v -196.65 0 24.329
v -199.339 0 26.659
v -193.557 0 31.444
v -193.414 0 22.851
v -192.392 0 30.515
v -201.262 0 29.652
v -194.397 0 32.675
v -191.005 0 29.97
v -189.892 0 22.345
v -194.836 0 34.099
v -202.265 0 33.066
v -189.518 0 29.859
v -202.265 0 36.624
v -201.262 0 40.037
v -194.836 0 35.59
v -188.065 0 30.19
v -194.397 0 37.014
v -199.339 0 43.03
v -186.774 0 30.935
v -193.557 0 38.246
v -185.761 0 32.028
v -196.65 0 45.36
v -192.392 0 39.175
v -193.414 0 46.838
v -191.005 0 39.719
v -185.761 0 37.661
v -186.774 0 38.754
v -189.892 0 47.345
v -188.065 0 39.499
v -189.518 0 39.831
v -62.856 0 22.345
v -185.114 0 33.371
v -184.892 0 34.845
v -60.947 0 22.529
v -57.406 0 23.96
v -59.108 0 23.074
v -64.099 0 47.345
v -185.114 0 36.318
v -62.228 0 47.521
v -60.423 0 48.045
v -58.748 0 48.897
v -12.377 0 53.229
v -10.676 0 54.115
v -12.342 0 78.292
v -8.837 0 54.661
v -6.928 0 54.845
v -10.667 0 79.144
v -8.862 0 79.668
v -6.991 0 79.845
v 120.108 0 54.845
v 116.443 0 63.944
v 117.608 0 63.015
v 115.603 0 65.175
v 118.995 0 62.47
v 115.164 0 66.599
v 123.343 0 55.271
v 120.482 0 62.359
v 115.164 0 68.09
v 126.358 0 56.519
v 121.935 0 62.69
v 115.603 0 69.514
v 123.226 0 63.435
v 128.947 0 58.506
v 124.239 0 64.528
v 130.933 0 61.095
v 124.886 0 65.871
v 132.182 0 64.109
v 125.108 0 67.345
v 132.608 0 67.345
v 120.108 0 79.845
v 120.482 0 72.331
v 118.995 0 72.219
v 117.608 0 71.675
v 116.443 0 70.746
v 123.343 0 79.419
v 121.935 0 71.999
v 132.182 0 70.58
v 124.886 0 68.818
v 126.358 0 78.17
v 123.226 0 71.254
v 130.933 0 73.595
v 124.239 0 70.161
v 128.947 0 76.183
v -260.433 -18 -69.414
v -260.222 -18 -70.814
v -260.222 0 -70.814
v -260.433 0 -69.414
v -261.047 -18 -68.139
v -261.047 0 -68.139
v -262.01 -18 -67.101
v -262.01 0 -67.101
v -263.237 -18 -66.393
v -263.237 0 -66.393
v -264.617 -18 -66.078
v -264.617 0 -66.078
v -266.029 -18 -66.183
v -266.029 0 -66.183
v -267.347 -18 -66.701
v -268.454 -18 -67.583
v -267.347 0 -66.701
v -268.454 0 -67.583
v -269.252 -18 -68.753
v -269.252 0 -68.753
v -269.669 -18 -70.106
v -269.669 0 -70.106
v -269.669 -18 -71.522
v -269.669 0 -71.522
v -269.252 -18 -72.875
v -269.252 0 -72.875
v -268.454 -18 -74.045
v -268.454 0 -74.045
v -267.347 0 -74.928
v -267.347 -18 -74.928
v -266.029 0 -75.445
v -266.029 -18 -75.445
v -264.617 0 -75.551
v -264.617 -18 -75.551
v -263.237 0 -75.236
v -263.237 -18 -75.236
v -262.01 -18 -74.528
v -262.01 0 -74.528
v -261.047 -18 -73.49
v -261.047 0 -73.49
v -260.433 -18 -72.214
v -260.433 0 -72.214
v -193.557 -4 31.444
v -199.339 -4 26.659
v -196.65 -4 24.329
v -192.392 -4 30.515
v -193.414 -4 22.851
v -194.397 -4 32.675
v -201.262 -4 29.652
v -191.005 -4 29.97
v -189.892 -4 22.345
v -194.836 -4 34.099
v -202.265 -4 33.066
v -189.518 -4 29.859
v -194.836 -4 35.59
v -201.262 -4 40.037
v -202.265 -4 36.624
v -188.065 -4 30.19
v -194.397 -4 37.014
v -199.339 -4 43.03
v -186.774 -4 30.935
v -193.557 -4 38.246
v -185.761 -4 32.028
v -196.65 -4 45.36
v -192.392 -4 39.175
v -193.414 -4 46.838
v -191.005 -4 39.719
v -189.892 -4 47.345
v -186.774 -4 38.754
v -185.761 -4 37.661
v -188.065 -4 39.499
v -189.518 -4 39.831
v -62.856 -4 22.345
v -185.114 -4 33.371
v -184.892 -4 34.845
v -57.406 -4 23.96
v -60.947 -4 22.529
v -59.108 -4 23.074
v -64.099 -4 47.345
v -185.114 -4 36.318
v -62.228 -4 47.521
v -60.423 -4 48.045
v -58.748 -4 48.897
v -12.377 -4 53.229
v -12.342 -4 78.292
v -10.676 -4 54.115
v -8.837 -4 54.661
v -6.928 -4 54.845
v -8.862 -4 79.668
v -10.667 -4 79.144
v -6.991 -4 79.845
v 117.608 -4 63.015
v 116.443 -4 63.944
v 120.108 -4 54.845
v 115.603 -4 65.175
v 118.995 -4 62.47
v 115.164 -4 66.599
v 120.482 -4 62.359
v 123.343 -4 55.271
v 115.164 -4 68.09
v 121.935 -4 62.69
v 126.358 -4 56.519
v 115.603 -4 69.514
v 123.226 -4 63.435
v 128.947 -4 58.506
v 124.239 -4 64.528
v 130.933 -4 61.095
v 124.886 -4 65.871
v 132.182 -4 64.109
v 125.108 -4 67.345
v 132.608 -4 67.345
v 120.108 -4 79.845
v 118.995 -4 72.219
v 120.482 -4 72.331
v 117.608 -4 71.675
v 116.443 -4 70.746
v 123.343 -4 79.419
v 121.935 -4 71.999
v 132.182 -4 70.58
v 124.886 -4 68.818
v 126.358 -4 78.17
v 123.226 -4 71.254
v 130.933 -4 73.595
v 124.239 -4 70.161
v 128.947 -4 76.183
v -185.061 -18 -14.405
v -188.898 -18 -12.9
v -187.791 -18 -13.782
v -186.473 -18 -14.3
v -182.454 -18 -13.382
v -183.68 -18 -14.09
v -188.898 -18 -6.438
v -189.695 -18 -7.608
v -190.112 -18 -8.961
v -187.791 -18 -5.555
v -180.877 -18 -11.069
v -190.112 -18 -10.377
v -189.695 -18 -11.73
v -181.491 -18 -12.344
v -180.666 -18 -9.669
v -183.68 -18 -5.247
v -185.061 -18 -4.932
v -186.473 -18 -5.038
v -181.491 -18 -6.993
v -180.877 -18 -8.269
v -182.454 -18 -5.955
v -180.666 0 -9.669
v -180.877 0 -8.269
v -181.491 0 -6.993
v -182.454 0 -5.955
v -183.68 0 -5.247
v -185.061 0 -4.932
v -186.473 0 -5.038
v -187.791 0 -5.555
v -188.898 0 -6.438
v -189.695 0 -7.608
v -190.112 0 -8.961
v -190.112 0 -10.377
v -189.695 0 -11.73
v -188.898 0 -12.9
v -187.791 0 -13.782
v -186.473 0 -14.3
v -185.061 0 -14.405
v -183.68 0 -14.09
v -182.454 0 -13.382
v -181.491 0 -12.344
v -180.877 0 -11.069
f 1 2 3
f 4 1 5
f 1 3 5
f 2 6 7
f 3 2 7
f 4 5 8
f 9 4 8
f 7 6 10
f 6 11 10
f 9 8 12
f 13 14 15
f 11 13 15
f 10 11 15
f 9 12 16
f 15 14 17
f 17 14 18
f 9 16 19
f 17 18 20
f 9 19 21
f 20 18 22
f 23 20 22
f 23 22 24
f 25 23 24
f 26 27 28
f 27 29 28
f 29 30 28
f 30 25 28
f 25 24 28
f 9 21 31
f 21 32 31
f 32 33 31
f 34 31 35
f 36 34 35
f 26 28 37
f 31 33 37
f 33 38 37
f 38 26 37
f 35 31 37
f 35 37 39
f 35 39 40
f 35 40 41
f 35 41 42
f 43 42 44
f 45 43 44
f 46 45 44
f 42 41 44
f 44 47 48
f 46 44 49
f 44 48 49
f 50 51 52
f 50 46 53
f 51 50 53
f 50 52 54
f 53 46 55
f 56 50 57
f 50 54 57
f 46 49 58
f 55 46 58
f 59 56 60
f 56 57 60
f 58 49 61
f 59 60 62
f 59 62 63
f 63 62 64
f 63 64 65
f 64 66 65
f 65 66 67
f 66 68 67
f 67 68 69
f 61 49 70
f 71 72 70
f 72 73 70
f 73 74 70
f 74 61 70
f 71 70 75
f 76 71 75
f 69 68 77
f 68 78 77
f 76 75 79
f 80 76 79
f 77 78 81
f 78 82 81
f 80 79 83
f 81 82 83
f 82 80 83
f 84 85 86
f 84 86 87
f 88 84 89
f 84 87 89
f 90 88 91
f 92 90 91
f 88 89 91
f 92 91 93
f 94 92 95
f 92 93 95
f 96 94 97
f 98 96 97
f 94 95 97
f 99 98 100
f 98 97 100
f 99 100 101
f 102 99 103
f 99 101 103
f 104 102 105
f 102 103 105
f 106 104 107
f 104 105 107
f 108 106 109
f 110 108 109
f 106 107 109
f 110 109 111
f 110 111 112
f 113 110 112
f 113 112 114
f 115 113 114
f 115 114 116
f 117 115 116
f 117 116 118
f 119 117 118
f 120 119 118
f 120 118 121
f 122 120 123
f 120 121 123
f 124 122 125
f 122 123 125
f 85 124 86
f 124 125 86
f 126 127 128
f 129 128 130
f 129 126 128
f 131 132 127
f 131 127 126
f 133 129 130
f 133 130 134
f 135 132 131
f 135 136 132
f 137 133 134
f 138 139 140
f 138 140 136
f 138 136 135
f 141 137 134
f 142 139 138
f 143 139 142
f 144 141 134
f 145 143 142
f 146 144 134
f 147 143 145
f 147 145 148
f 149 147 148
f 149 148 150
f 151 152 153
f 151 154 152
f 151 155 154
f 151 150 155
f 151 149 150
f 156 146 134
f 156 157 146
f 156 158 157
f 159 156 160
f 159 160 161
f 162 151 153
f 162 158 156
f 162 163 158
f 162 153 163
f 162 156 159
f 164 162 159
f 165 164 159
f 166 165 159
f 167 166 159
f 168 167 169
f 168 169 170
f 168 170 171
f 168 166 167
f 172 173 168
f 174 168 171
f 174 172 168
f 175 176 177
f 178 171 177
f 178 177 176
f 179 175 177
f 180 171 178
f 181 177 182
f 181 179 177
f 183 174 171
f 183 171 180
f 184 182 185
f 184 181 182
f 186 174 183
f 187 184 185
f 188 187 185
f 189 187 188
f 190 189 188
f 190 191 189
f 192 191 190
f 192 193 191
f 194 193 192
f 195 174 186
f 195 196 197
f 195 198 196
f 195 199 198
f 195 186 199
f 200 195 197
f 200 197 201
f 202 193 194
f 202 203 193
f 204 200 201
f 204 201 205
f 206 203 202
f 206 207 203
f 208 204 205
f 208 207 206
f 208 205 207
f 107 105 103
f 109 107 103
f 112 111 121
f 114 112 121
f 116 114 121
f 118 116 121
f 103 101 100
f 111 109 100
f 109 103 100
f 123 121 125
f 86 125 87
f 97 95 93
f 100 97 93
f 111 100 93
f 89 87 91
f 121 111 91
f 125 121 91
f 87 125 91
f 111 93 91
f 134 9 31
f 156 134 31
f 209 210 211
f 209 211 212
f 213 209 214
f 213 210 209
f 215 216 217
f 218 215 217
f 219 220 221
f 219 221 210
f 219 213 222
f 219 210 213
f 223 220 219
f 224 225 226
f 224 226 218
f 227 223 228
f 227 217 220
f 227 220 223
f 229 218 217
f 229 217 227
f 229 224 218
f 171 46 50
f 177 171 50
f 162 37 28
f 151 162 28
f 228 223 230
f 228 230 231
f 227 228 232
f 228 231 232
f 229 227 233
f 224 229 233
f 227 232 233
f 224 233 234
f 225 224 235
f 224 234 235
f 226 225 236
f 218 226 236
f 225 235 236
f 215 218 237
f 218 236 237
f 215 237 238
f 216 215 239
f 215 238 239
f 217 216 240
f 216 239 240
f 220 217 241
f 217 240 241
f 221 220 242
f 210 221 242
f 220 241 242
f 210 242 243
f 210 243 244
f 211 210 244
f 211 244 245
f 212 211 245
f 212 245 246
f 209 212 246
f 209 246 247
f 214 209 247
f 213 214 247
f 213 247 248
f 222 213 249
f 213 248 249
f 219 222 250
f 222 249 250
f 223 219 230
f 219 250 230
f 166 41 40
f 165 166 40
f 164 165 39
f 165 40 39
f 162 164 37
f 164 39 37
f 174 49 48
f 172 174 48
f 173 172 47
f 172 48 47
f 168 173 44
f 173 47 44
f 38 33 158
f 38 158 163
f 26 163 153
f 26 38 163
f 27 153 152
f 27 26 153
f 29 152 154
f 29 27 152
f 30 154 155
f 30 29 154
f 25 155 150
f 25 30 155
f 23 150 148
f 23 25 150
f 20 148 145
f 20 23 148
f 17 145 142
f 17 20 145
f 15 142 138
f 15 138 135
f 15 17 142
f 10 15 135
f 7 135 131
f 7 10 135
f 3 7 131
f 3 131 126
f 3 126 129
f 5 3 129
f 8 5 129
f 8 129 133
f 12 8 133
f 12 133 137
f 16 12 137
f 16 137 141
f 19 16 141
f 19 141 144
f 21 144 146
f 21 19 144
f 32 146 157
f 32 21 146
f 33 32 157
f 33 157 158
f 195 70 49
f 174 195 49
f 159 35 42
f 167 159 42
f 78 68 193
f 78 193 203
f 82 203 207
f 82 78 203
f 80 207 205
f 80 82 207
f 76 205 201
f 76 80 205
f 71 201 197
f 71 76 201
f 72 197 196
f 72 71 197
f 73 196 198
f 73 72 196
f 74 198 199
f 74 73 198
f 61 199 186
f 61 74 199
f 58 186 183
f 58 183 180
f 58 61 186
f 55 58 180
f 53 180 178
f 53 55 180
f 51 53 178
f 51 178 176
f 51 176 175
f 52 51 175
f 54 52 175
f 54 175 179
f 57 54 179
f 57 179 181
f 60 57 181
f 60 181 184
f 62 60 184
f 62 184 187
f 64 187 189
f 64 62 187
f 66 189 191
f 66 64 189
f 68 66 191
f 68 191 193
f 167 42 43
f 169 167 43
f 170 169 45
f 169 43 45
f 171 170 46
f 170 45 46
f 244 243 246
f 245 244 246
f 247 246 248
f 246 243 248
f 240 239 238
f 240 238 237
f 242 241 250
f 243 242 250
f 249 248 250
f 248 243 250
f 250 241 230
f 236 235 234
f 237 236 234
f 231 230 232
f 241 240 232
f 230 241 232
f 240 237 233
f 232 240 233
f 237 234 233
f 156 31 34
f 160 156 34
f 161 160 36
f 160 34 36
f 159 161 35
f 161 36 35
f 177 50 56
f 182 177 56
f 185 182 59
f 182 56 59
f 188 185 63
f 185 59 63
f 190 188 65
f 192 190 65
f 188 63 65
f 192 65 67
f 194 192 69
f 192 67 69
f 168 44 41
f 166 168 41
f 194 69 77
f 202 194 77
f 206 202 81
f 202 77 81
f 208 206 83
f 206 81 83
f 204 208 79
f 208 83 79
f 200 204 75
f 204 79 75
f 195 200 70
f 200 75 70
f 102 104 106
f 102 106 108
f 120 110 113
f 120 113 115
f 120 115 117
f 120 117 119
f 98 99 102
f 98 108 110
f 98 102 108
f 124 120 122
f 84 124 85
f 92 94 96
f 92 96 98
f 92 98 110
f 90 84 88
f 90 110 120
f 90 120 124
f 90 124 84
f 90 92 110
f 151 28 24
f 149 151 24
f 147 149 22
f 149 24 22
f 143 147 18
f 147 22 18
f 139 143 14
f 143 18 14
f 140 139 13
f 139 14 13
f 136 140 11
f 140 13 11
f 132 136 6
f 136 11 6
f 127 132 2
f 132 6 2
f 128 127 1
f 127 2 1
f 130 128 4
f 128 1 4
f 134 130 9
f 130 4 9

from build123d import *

# Parameters (mm, degrees)
F0_R      = 5
F0_R_2    = 4.75
F1_DEPTH  = 4
F1_FACE_R = 4.75
F2_DEPTH  = 14
F3_DEPTH  = 14


with BuildPart() as f1:
    # F0 (on Front) → F1 (new body)
    with BuildSketch(Plane.XZ):
        with BuildLine():
            Line((-189.891916, 22.344649), (-62.856317, 22.344649))
            ThreePointArc((-62.856317, 22.344649), (-60.014166, 22.757044), (-57.406433, 23.960213))
            Line((-57.406433, 23.960213), (-12.377399, 53.229085))
            ThreePointArc((-12.377399, 53.229085), (-9.769666, 54.432255), (-6.927515, 54.844649))
            Line((-6.927515, 54.844649), (120.108084, 54.844649))
            ThreePointArc((120.108084, 54.844649), (128.946919, 58.505815), (132.608084, 67.344649))
            ThreePointArc((132.608084, 67.344649), (128.946919, 76.183484), (120.108084, 79.844649))
            Line((120.108084, 79.844649), (-6.991172, 79.844649))
            ThreePointArc((-6.991172, 79.844649), (-9.777076, 79.448749), (-12.342392, 78.292397))
            Line((-12.342392, 78.292397), (-58.747838, 48.896901))
            ThreePointArc((-58.747838, 48.896901), (-61.313154, 47.740549), (-64.099058, 47.344649))
            Line((-64.099058, 47.344649), (-172.616858, 47.344649))
            Line((-172.616858, 47.344649), (-189.891916, 47.344649))
            ThreePointArc((-189.891916, 47.344649), (-202.391916, 34.844649), (-189.891916, 22.344649))
        make_face()
        with Locations((-189.891916, 34.844649)):
            Circle(F0_R, mode=Mode.SUBTRACT)
        with Locations((120.108084, 67.344649)):
            Circle(F0_R, mode=Mode.SUBTRACT)
        with Locations((-185.415551, -9.668712)):
            Circle(F0_R_2)
        with Locations((-264.971912, -70.814312)):
            Circle(F0_R_2)
    extrude(amount=F1_DEPTH)

    # F1_face (on face) → F2 (join)
    with BuildSketch(Plane(origin=(-185.415551, -4, -9.668712), x_dir=(1, 0, 0), z_dir=(0, -1, 0))):
        Circle(F1_FACE_R)
    extrude(amount=F2_DEPTH)

    # F1_face (on face) → F3 (join)
    with BuildSketch(Plane(origin=(-185.415551, -4, -9.668712), x_dir=(1, 0, 0), z_dir=(0, -1, 0))):
        with Locations((-79.556361, -61.1456)):
            Circle(F1_FACE_R)
    extrude(amount=F3_DEPTH)


solid = f1.part
